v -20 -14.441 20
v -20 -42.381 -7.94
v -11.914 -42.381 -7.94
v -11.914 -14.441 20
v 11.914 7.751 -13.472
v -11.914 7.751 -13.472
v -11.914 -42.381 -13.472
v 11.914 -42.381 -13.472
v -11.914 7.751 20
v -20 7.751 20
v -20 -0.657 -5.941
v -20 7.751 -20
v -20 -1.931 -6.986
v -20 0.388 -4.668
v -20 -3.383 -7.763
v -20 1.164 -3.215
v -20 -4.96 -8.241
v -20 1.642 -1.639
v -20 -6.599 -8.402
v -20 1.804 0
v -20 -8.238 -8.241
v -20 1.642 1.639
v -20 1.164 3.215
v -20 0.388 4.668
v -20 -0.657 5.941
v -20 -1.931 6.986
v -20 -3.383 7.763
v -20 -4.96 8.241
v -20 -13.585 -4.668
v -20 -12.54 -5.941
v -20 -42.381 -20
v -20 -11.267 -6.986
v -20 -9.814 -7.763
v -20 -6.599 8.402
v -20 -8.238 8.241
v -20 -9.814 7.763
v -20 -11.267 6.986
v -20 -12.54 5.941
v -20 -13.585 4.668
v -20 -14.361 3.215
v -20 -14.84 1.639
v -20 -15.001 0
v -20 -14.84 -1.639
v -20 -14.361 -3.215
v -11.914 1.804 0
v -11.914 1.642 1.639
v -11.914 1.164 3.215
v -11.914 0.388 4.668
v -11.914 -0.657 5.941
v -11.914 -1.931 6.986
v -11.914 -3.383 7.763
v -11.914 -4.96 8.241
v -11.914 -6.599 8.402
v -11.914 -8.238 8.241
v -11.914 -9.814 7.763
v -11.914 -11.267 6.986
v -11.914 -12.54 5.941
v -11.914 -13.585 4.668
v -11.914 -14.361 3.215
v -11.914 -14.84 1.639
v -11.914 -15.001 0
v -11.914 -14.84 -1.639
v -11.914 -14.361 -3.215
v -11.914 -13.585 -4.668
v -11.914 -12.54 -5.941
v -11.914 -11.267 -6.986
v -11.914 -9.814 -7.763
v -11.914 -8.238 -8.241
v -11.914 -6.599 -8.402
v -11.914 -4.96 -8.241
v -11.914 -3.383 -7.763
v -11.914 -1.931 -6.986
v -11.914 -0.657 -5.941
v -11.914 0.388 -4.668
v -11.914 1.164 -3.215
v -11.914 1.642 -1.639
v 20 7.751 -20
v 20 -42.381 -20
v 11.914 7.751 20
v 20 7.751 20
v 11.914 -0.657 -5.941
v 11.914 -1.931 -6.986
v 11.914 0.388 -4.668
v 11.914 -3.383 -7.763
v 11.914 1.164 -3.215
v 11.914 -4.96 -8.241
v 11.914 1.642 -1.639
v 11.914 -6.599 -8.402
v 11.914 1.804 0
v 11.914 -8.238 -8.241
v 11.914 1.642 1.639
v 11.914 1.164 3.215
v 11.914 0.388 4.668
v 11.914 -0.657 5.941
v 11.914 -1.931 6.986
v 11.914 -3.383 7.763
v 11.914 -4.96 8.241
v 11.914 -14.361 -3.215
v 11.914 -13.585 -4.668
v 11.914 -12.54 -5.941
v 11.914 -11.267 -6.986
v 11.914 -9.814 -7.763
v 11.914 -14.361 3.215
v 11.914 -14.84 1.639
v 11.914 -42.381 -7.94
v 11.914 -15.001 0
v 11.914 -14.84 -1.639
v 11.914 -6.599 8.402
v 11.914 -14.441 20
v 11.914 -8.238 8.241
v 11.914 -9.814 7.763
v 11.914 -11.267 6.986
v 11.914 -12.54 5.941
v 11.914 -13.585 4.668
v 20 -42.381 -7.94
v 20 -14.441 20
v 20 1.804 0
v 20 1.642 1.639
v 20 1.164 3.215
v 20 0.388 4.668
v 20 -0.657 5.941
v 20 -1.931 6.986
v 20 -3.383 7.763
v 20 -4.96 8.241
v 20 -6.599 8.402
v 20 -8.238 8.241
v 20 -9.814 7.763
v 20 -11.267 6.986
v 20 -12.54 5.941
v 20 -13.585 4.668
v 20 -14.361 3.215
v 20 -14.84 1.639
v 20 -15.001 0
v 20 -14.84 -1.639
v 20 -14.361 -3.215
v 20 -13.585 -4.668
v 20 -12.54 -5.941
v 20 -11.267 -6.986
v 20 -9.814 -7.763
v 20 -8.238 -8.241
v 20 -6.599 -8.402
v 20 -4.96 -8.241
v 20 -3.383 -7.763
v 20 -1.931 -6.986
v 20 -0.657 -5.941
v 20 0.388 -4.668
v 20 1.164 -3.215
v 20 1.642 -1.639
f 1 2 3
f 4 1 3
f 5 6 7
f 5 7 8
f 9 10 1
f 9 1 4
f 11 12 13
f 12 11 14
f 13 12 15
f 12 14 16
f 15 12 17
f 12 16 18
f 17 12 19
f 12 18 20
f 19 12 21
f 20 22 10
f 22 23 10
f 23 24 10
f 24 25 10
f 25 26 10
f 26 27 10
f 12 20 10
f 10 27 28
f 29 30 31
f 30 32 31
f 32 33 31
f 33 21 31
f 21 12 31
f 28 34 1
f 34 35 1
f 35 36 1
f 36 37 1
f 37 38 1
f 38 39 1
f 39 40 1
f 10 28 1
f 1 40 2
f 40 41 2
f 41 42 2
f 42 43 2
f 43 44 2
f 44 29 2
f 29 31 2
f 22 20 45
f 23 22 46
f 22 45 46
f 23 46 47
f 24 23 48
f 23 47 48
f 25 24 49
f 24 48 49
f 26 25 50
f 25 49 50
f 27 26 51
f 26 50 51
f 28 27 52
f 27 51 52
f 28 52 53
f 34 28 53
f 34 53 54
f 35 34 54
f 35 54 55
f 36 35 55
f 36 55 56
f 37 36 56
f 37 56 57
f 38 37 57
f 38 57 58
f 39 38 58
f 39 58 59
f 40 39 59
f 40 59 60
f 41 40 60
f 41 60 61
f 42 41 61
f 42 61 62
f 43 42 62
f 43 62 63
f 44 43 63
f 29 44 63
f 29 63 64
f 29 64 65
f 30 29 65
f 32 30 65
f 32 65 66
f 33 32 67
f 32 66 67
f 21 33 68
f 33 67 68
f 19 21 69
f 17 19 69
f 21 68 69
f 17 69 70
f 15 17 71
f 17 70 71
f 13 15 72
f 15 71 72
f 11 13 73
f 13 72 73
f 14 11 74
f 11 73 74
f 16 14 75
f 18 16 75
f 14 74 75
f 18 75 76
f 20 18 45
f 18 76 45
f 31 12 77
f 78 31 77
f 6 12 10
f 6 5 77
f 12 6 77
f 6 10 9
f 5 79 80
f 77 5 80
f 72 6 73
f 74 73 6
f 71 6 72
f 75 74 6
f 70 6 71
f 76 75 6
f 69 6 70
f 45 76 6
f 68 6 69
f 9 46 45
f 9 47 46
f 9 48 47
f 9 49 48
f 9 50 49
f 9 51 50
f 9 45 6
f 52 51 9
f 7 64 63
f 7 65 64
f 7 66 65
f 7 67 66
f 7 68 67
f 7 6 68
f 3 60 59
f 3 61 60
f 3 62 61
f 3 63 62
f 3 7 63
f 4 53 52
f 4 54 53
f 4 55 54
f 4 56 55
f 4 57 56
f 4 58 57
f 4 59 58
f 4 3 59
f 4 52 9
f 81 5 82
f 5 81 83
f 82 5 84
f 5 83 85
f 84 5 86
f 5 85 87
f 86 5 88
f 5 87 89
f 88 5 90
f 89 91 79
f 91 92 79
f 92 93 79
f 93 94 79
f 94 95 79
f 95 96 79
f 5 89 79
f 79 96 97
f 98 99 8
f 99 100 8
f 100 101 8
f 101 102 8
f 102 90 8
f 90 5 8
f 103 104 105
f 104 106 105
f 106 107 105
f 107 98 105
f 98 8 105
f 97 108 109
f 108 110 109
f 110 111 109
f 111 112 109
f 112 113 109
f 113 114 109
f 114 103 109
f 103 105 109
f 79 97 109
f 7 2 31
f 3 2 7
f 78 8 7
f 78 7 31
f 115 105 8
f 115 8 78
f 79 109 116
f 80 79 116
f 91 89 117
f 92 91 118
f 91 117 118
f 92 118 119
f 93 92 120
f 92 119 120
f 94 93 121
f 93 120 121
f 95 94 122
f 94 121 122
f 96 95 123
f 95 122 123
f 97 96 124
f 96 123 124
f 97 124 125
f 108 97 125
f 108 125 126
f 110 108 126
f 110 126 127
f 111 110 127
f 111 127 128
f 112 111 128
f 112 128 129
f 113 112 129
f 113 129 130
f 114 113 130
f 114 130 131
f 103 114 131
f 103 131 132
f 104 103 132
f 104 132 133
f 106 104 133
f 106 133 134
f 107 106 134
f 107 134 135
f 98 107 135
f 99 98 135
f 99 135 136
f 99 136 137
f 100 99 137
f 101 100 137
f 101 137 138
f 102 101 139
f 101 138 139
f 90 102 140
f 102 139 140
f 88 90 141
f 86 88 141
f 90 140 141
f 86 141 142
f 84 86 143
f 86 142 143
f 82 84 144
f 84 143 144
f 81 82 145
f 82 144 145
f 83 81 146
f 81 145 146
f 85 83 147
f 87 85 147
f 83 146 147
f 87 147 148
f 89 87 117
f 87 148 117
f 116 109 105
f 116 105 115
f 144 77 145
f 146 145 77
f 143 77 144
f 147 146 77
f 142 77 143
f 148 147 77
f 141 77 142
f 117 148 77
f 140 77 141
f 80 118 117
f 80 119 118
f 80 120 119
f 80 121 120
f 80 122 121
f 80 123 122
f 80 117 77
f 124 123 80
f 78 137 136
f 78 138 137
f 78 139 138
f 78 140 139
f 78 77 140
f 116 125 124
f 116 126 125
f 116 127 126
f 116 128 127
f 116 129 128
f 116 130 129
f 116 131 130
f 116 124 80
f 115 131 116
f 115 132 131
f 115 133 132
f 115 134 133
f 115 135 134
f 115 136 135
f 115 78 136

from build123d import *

# Parameters (mm, degrees)
F0_W          = 40
F0_H          = 40
F1_DEPTH      = 42.38128
F1_DEPTH_BACK = 7.75136
F2_W          = 11.914433
F2_H          = 33.472474
F3_DEPTH      = 52.48423
F4_SIZE       = 27.94
F5_R          = 8.402313
F6_DEPTH      = 40


with BuildPart() as f1:
    # F0 (on Front) → F1 (new body, two sides)
    with BuildSketch(Plane.XZ) as f1_sk:
        Rectangle(F0_W, F0_H)
    extrude(amount=F1_DEPTH)
    extrude(f1_sk.sketch, amount=-F1_DEPTH_BACK)

    # F2 (on face) → F3 (cut)
    with BuildSketch(Plane.XZ.offset(42.38128)):
        with Locations((-5.957216, 3.263763)):
            Rectangle(F2_W, F2_H)
        with Locations((5.957216, 3.263763)):
            Rectangle(F2_W, F2_H)
    extrude(amount=-F3_DEPTH, mode=Mode.SUBTRACT)

    # F4
    f4_edges = [f1.edges().sort_by_distance(p)[0] for p in [
        (-15.957216, -42.38128, 20),
        (15.957216, -42.38128, 20),
    ]]
    chamfer(f4_edges, length=F4_SIZE)

    # F5 (on face) → F6 (cut)
    with BuildSketch(Plane.YZ.offset(20)):
        with Locations((-6.598762, 0)):
            Circle(F5_R)
    extrude(amount=-F6_DEPTH, mode=Mode.SUBTRACT)


solid = f1.part
